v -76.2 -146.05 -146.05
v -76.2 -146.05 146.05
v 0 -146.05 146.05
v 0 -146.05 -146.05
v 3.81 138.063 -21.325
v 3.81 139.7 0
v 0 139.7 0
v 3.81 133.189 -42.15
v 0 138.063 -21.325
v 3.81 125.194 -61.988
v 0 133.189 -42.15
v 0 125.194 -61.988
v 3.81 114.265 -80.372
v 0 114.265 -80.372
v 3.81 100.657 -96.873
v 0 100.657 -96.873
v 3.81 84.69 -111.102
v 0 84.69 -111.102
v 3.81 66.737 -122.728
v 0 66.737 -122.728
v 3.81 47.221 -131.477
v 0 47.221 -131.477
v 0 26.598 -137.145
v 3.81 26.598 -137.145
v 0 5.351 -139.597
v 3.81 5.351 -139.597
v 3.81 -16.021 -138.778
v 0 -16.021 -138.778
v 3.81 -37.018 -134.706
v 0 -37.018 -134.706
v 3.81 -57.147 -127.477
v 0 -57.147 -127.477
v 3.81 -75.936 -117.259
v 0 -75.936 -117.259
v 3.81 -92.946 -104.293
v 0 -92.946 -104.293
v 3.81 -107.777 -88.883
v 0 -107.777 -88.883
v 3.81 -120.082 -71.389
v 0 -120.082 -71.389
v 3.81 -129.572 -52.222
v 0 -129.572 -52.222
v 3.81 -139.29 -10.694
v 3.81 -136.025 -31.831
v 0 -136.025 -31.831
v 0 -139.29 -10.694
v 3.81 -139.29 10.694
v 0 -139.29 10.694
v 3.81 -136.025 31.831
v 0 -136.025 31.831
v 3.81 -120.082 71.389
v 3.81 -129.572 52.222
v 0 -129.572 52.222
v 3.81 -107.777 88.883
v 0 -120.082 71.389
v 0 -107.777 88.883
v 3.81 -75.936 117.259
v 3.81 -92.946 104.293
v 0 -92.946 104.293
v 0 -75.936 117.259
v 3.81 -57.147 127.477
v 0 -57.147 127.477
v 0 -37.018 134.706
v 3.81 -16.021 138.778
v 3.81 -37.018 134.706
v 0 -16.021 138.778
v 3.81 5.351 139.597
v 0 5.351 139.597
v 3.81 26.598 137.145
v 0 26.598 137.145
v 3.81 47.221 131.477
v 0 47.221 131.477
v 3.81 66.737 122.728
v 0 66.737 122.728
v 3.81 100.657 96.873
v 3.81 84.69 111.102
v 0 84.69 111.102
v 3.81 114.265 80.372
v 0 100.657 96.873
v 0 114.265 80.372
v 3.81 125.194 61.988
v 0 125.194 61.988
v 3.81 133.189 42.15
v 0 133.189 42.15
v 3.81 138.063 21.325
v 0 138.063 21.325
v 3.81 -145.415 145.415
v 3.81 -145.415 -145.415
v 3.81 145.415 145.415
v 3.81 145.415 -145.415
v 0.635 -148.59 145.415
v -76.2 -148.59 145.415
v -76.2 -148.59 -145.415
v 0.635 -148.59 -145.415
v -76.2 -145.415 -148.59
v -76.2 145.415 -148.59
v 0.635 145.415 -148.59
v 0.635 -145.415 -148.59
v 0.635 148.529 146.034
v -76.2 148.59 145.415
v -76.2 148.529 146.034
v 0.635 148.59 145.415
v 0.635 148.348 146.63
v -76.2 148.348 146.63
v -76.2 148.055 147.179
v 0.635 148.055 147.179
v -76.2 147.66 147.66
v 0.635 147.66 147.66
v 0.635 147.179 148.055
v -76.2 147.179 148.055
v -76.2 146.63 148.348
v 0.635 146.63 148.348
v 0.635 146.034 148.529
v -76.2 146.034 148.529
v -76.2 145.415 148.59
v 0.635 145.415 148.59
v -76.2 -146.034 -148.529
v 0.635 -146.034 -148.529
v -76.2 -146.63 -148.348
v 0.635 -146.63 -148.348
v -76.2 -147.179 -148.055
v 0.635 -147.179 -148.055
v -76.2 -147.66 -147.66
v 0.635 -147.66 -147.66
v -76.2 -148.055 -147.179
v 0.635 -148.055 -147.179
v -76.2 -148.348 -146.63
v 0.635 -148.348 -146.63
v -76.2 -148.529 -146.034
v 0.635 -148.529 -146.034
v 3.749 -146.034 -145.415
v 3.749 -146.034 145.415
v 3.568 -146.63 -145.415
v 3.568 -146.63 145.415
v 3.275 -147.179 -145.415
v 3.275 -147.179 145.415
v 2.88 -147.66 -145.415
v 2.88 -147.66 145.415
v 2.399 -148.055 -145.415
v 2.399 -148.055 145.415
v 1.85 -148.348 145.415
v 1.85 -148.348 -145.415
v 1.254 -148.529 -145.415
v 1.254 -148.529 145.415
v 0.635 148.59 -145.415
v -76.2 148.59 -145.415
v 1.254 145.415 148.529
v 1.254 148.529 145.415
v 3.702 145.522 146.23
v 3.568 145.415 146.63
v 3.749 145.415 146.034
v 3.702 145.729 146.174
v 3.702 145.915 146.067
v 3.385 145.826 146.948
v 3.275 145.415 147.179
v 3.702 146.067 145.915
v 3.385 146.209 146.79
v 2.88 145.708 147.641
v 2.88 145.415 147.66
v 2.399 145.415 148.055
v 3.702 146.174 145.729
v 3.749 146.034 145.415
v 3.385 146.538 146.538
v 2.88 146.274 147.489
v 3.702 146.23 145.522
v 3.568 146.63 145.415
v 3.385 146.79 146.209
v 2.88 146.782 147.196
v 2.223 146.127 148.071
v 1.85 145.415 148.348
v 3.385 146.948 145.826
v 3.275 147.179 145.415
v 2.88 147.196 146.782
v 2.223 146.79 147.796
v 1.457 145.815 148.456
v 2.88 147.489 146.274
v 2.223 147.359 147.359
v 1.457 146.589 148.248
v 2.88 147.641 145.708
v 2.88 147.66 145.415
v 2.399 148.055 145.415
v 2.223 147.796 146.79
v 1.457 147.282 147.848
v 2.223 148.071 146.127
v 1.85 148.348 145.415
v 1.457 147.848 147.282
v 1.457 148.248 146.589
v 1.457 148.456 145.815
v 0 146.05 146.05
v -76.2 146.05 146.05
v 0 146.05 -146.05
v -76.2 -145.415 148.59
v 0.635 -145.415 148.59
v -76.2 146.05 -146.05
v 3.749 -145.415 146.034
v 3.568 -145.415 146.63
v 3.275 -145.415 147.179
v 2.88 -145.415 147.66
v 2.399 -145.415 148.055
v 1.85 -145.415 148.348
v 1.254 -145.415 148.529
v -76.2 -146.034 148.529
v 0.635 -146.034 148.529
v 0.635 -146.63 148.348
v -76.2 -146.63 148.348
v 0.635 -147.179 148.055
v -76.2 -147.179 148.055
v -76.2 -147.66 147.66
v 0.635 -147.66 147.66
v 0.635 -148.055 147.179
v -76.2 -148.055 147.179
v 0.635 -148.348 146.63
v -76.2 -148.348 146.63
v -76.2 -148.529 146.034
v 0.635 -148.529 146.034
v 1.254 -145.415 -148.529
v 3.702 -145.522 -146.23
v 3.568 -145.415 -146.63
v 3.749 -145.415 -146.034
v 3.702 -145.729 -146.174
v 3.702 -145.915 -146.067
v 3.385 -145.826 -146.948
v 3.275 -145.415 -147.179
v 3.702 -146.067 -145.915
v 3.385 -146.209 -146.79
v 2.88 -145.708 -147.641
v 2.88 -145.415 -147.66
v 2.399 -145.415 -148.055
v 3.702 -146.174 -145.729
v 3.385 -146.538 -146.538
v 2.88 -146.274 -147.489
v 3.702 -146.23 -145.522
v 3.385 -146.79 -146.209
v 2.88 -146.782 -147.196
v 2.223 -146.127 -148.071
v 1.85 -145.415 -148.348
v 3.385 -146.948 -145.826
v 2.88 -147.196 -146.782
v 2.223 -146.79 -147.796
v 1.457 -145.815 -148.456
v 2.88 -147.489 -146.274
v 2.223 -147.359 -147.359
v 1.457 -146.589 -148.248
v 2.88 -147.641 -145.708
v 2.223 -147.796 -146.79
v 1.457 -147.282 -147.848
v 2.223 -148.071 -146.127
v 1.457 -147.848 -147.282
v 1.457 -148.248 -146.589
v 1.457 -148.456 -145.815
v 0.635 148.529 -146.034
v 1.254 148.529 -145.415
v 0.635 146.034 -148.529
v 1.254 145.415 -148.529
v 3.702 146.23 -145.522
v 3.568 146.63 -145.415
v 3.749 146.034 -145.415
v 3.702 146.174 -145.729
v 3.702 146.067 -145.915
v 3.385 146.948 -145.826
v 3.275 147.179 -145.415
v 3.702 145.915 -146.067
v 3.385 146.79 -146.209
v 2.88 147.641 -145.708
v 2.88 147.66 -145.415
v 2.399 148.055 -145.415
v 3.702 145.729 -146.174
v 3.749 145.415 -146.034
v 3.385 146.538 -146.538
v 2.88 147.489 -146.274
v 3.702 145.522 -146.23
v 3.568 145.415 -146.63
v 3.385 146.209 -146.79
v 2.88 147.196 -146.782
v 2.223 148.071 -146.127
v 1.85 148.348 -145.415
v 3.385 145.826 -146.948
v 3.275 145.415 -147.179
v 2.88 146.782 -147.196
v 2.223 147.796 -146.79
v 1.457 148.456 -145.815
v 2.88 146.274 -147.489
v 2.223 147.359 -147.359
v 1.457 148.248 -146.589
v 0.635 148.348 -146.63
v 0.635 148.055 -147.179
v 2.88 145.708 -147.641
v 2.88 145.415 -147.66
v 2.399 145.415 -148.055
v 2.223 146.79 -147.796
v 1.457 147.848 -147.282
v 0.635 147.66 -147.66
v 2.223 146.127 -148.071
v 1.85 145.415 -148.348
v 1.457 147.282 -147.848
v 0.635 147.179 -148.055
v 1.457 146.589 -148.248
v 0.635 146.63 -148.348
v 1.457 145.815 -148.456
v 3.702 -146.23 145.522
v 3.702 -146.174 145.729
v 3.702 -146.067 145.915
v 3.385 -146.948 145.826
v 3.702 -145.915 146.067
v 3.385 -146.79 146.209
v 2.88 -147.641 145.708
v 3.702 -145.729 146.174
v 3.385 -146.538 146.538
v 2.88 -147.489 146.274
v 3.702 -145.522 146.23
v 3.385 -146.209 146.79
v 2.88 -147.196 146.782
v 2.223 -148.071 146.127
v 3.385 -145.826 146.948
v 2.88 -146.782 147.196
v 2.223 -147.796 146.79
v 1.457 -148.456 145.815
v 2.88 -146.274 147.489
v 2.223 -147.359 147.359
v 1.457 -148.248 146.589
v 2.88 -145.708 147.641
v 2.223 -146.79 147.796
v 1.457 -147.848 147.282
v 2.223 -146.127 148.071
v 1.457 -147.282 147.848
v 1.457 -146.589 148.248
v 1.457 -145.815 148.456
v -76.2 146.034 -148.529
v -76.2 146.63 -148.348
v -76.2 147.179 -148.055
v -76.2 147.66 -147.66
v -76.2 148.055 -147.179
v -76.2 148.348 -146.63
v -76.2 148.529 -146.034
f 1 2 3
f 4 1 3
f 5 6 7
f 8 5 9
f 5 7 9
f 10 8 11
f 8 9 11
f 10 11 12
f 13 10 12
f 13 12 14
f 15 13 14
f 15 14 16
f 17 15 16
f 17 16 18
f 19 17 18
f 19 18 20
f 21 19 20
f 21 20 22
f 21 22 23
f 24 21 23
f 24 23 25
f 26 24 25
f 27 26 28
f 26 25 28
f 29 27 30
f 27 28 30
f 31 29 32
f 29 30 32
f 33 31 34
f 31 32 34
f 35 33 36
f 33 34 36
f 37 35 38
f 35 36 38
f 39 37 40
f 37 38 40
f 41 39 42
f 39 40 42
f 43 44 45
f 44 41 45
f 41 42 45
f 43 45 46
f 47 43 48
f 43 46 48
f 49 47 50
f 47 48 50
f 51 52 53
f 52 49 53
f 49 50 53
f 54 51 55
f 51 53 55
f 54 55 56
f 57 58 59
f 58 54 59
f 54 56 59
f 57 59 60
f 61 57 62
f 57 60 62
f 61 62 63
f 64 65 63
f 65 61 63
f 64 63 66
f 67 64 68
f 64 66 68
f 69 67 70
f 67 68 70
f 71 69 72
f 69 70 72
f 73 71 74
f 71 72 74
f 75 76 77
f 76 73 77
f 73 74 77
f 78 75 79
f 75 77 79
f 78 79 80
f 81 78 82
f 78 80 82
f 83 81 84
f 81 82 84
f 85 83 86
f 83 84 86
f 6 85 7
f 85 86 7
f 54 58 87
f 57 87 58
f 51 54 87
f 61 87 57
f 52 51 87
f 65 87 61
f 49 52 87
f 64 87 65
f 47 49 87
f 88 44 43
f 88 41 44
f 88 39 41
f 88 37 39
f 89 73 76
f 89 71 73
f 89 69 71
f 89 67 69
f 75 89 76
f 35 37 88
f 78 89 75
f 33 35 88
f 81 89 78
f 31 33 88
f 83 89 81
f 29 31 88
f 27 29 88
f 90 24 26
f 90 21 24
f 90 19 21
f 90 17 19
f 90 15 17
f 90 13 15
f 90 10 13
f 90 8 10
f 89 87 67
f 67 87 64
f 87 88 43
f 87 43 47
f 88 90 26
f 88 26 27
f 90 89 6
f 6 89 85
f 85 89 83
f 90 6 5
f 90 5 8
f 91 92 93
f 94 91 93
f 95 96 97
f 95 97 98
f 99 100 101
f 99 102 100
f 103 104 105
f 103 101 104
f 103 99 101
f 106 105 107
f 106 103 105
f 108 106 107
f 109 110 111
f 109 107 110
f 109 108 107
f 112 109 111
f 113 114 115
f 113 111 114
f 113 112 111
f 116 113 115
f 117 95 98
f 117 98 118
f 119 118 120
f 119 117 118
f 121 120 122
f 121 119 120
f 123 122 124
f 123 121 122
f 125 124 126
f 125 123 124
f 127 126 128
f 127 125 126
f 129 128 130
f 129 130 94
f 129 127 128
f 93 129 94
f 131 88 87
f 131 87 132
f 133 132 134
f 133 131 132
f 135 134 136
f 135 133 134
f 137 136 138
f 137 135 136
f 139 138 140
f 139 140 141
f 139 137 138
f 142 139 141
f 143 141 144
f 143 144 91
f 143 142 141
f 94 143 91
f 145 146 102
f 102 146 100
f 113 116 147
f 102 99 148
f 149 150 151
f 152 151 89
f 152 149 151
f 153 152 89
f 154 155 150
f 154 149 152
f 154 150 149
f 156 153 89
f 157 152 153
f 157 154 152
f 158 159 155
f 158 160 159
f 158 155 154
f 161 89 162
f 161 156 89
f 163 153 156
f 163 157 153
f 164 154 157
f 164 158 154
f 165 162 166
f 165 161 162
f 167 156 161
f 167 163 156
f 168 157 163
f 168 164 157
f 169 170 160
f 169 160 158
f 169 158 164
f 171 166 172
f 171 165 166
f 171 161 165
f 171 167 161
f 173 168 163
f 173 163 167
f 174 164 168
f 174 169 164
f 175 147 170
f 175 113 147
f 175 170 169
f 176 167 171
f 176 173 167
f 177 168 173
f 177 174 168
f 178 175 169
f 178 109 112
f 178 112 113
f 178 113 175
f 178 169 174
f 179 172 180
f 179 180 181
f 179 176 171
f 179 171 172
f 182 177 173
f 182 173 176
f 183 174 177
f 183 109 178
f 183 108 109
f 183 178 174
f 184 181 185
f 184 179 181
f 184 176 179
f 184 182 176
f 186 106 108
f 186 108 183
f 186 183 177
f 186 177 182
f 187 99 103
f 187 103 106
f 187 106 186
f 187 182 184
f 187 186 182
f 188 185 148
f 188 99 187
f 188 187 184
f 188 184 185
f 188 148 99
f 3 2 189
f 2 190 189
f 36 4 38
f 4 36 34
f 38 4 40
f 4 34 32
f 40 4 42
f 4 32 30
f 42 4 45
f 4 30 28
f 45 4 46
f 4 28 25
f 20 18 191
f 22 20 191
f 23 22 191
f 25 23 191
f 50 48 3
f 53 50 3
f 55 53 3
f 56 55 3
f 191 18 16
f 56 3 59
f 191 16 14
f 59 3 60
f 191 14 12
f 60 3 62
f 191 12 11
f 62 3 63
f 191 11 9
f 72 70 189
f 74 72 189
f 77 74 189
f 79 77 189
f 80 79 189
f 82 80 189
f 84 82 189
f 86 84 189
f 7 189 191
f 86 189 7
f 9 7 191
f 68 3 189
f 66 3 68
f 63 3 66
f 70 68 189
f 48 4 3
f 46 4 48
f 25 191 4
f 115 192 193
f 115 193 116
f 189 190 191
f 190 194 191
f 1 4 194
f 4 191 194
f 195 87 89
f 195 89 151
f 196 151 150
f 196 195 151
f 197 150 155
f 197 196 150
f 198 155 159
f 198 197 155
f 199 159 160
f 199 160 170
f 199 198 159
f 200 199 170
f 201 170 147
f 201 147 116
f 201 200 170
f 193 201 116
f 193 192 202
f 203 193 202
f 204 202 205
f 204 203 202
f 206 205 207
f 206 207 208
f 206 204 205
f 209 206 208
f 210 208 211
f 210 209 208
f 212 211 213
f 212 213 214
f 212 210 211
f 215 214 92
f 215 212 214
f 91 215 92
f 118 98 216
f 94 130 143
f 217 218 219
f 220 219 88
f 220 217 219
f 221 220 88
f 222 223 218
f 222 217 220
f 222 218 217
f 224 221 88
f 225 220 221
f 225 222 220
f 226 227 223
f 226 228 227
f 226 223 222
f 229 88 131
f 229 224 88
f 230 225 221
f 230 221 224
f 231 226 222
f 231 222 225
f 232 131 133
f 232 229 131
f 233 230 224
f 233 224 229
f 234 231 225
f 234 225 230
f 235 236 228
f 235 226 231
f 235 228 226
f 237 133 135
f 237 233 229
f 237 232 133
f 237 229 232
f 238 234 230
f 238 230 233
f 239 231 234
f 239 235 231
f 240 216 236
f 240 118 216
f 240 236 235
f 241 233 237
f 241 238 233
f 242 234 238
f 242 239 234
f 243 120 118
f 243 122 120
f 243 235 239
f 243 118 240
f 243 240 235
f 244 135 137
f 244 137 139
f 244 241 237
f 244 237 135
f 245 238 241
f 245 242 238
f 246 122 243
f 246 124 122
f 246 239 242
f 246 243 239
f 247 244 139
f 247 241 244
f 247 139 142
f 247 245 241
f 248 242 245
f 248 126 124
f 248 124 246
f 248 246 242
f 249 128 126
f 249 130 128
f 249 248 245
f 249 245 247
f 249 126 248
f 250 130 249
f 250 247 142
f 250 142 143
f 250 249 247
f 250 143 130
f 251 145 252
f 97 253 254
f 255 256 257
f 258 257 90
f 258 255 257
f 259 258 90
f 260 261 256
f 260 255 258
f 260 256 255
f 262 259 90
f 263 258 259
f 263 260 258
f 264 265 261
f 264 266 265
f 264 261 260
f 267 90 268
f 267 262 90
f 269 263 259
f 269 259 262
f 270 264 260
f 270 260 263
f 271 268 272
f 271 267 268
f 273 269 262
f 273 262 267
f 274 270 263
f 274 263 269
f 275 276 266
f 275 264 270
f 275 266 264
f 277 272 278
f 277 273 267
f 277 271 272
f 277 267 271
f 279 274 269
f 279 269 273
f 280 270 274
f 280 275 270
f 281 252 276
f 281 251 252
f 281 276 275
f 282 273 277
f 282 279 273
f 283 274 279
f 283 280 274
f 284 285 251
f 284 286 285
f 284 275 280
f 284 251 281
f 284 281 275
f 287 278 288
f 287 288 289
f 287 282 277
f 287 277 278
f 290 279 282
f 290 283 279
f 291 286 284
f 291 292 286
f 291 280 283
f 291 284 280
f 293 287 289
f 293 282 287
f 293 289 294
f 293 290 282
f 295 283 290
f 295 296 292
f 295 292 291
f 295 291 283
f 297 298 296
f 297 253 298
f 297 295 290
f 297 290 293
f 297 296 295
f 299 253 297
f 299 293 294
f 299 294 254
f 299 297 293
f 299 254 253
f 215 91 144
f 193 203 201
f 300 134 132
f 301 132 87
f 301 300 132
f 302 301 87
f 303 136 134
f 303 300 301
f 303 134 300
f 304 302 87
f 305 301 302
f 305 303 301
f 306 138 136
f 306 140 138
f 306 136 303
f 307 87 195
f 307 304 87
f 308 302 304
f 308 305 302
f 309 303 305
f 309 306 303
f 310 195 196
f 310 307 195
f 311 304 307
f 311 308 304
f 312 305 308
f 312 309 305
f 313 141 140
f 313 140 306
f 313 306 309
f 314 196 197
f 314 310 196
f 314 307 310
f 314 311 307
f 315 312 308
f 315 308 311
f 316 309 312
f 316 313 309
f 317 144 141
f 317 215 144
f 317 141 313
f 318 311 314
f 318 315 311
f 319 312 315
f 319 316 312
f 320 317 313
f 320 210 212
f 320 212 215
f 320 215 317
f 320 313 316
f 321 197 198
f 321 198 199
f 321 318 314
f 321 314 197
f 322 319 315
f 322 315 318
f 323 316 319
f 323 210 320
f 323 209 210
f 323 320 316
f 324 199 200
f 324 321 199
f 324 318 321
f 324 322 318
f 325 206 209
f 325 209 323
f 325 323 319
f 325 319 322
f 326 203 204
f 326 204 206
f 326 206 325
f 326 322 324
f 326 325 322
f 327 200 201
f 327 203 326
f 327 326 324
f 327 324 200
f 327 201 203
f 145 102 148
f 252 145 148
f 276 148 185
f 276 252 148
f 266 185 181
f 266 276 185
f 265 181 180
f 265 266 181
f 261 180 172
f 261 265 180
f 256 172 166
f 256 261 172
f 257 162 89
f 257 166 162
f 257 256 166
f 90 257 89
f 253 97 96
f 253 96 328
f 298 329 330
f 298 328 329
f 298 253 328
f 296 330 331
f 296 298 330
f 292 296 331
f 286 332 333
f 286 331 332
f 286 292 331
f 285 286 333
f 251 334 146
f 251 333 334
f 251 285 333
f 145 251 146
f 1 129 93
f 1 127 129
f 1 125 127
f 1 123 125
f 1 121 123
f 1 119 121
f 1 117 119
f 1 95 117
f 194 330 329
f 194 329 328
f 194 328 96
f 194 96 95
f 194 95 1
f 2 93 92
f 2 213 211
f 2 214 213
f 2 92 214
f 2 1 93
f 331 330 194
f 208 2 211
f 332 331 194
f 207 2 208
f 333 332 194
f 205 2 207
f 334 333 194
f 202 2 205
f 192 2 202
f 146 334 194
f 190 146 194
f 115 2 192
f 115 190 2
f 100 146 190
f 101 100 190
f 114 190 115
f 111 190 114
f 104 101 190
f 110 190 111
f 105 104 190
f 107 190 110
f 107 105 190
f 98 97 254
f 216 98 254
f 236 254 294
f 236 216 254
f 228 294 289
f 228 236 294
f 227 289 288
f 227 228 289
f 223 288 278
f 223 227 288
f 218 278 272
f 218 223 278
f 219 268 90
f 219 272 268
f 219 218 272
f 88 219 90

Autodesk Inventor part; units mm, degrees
ref_plane "YZ Plane" through (0, 0, 0) normal (1, 0, 0) x (0, 1, 0)
ref_plane "XZ Plane" through (0, 0, 0) normal (0, 1, 0) x (-1, 0, 0)
ref_plane "XY Plane" through (0, 0, 0) normal (0, 0, 1) x (1, 0, 0)
sketch "Sketch1" plane through (0, 0, 0) normal (1, 0, 0) x (0, 1, 0)
  circle A0 centre (0, 0) radius 139.7
  line L0 (0, -139.7) -> (0, -146.05)
  line L1 (-139.7, 0) -> (-146.05, 0)
  line L2 (146.05, 0) -> (146.05, -146.05)
  line L3 (146.05, -146.05) -> (-146.05, -146.05)
  line L4 (-146.05, -146.05) -> (-146.05, 146.05)
  line L5 (-146.05, 146.05) -> (146.05, 146.05)
  line L6 (146.05, 146.05) -> (146.05, 0)
  dimension "d1" = 279.4
sketch "Sketch2" plane through (0, 0, 0) normal (0, 0, 1) x (1, 0, 0)
  point P0 (0, 0)
extrude "Extrusion1" add sketch "Sketch1" along normal blind 3.81 contours A0 L1 L4 L5 L6 L2 L3 L0 | A0 L0 L3 L4 L1
sketch "Sketch3" plane through (0, -146.05, 146.05) normal (0, 0, 1) x (1, 0, 0)
  line L0 (0, 292.1) -> (0, 0) projected
  line L1 (3.81, 292.1) -> (-76.2, 292.1)
  line L2 (-76.2, 292.1) -> (-76.2, 0)
  line L3 (-76.2, 0) -> (3.81, 0)
  point P0 (0, 146.05)
  dimension "d12" = 80.01
extrude "Extrusion3" add sketch "Sketch3" along normal blind 2.54
sketch "Sketch4" plane through (3.81, -146.05, -146.05) normal (0, -1, 0) x (1, 0, 0)
  line L0 (-3.81, 292.1) -> (0, 292.1) projected
  line L1 (-3.81, 292.1) -> (-80.01, 292.1) projected
  line L2 (-3.81, 292.1) -> (-80.01, 292.1)
  line L3 (-3.81, 292.1) -> (-3.81, 0) projected
  line L4 (-3.81, 0) -> (-80.01, 0)
  line L5 (-80.01, 0) -> (-80.01, 292.1)
  point P0 (-3.81, 146.05)
  dimension "d15" = 76.2
extrude "Extrusion4" add sketch "Sketch4" along normal blind 2.54
sketch "Sketch6" plane through (3.81, -146.05, -146.05) normal (0, 0, -1) x (-1, 0, 0)
  line L0 (80.01, 0) -> (3.81, 0) projected
  line L1 (3.81, 0) -> (80.01, 0)
  line L2 (80.01, 292.1) -> (80.01, 0) projected
  line L3 (80.01, 0) -> (80.01, 292.1)
  line L4 (80.01, 292.1) -> (3.81, 292.1)
  line L5 (3.81, 292.1) -> (3.81, 0)
  line L6 (3.81, 6.35) -> (3.81, 285.75) projected
  point P0 (3.81, 146.05)
extrude "Extrusion5" add sketch "Sketch6" along normal blind 2.54
sketch "Sketch7" plane through (3.81, 146.05, 146.05) normal (0, 1, 0) x (1, 0, 0)
  line L0 (-3.81, 292.1) -> (0, 292.1) projected
  line L1 (-3.81, 292.1) -> (-80.01, 292.1)
  line L2 (-80.01, 292.1) -> (-80.01, 0)
  line L3 (-80.01, 0) -> (-3.81, 0)
  line L4 (-3.81, 292.1) -> (-3.81, 0)
  point P0 (-3.81, 146.05)
extrude "Extrusion6" add sketch "Sketch7" along normal blind 2.54
sketch "Sketch21" plane through (-76.2, -148.59, -146.05) normal (-1, 0, 0) x (0, 0, 1)
  line L0 (0, 0) -> (-2.54, 0)
  line L1 (-2.54, 0) -> (-2.54, 2.54)
  line L2 (0, 2.54) -> (-2.54, 2.54) projected
  line L3 (-2.54, 2.54) -> (0, 2.54)
  line L4 (0, 2.54) -> (0, 0) projected
  line L5 (0, 2.54) -> (0, 0)
  point P0 (146.05, 148.59)
extrude "Extrusion16" add sketch "Sketch21" against normal up to surface (76.2 mm away)
sketch "Sketch22" plane through (3.81, 148.59, 146.05) normal (0, 1, 0) x (1, 0, 0)
  line L0 (-3.81, 0) -> (-3.81, 294.64) projected
  line L1 (-80.01, 292.1) -> (-3.81, 292.1) projected
  line L2 (-3.81, 294.64) -> (-3.81, 292.1)
  line L3 (0, 292.1) -> (0, 0) projected
  line L4 (-3.81, 292.1) -> (0, 292.1)
  line L5 (0, 292.1) -> (0, 294.64)
  line L6 (0, 294.64) -> (-3.81, 294.64)
  point P0 (-3.81, 146.05)
extrude "Extrusion17" add sketch "Sketch22" against normal up to surface (297.18 mm away)
sketch "Sketch23" plane through (-76.2, -146.05, -146.05) normal (-1, 0, 0) x (0, 0, 1)
  line L0 (0, 292.1) -> (-2.54, 292.1) projected
  line L1 (-2.54, 292.1) -> (0, 292.1)
  line L2 (292.1, 294.64) -> (0, 294.64) projected
  line L3 (0, 292.1) -> (0, 294.64)
  line L4 (-2.54, 294.64) -> (-2.54, -2.54) projected
  line L5 (0, 294.64) -> (-2.54, 294.64)
  line L6 (-2.54, 294.64) -> (-2.54, 292.1)
  point P0 (146.05, 146.05)
extrude "Extrusion18" add sketch "Sketch23" against normal up to surface (76.2 mm away)
sketch "Sketch26" plane through (0, -146.05, 148.59) normal (0, 0, 1) x (1, 0, 0)
  line L0 (0, 292.1) -> (3.81, 292.1) projected
  line L1 (3.81, 292.1) -> (0, 292.1)
  line L2 (0, 292.1) -> (0, 294.64) projected
  line L3 (0, 292.1) -> (0, 294.64)
  line L4 (0, 294.64) -> (3.81, 294.64)
  line L5 (3.81, 294.64) -> (3.81, 292.1)
  point P0 (0, 146.05)
extrude "Extrusion20" add sketch "Sketch26" against normal up to surface (294.64 mm away)
sketch "Sketch27" plane through (0, -146.05, 148.59) normal (0, 0, 1) x (1, 0, 0)
  line L0 (0, 0) -> (3.81, 0) projected
  line L1 (3.81, 0) -> (0, 0)
  line L2 (0, 0) -> (0, -2.54) projected
  line L3 (0, 0) -> (0, -2.54)
  line L4 (0, -2.54) -> (3.81, -2.54) projected
  line L5 (0, -2.54) -> (3.81, -2.54)
  line L6 (3.81, 0) -> (3.81, -2.54) projected
  line L7 (3.81, -2.54) -> (3.81, 0)
  point P0 (0, 146.05)
extrude "Extrusion21" add sketch "Sketch27" against normal up to surface (294.64 mm away)
sketch "Sketch28" plane through (0, 146.05, 148.59) normal (0, -1, 0) x (1, 0, 0)
  line L0 (3.81, 0) -> (3.81, -2.54) projected
  line L1 (3.81, 0) -> (3.81, -2.54)
  line L2 (3.81, -2.54) -> (0, -2.54)
  line L3 (0, -2.54) -> (0, 0)
  line L4 (0, 0) -> (3.81, 0)
  point P0 (0, -148.59)
extrude "Extrusion22" add sketch "Sketch28" along normal up to surface (292.1 mm away)
sketch "Sketch29" plane through (-76.2, -146.05, -146.05) normal (-1, 0, 0) x (0, 0, 1)
  line L0 (292.1, 292.1) -> (294.64, 292.1) projected
  line L1 (294.64, 292.1) -> (292.1, 292.1)
  line L2 (292.1, 292.1) -> (292.1, 294.64) projected
  line L3 (292.1, 292.1) -> (292.1, 294.64)
  line L4 (294.64, 294.64) -> (294.64, 292.1) projected
  line L5 (292.1, 294.64) -> (294.64, 294.64)
  line L6 (294.64, 294.64) -> (294.64, 292.1)
  point P0 (146.05, 146.05)
extrude "Extrusion23" add sketch "Sketch29" against normal up to surface (76.2 mm away)
sketch "Sketch30" plane through (-76.2, -146.05, -146.05) normal (-1, 0, 0) x (0, 0, 1)
  line L0 (292.1, 0) -> (0, 0) projected
  line L1 (292.1, 0) -> (292.1, -2.54)
  line L2 (294.64, -2.54) -> (-2.54, -2.54) projected
  line L3 (294.64, -2.54) -> (294.64, 0)
  line L4 (294.64, -2.54) -> (294.64, 294.64) projected
  line L5 (292.1, 0) -> (294.64, 0)
  line L6 (292.1, 0) -> (292.1, -2.54) projected
  line L7 (292.1, -2.54) -> (294.64, -2.54)
  point P0 (146.05, 146.05)
extrude "Extrusion24" add sketch "Sketch30" against normal up to surface (76.2 mm away)
fillet "Fillet1" radius 3.175 8 edges at (-36.195, -148.59, 148.59) (-36.195, -148.59, -148.59) (-36.195, 148.59, -148.59) (-36.195, 148.59, 148.59) (3.81, 148.59, 0) (3.81, 0, 148.59) (3.81, 0, -148.59) (3.81, -148.59, 0)
properties part number "Base box"
